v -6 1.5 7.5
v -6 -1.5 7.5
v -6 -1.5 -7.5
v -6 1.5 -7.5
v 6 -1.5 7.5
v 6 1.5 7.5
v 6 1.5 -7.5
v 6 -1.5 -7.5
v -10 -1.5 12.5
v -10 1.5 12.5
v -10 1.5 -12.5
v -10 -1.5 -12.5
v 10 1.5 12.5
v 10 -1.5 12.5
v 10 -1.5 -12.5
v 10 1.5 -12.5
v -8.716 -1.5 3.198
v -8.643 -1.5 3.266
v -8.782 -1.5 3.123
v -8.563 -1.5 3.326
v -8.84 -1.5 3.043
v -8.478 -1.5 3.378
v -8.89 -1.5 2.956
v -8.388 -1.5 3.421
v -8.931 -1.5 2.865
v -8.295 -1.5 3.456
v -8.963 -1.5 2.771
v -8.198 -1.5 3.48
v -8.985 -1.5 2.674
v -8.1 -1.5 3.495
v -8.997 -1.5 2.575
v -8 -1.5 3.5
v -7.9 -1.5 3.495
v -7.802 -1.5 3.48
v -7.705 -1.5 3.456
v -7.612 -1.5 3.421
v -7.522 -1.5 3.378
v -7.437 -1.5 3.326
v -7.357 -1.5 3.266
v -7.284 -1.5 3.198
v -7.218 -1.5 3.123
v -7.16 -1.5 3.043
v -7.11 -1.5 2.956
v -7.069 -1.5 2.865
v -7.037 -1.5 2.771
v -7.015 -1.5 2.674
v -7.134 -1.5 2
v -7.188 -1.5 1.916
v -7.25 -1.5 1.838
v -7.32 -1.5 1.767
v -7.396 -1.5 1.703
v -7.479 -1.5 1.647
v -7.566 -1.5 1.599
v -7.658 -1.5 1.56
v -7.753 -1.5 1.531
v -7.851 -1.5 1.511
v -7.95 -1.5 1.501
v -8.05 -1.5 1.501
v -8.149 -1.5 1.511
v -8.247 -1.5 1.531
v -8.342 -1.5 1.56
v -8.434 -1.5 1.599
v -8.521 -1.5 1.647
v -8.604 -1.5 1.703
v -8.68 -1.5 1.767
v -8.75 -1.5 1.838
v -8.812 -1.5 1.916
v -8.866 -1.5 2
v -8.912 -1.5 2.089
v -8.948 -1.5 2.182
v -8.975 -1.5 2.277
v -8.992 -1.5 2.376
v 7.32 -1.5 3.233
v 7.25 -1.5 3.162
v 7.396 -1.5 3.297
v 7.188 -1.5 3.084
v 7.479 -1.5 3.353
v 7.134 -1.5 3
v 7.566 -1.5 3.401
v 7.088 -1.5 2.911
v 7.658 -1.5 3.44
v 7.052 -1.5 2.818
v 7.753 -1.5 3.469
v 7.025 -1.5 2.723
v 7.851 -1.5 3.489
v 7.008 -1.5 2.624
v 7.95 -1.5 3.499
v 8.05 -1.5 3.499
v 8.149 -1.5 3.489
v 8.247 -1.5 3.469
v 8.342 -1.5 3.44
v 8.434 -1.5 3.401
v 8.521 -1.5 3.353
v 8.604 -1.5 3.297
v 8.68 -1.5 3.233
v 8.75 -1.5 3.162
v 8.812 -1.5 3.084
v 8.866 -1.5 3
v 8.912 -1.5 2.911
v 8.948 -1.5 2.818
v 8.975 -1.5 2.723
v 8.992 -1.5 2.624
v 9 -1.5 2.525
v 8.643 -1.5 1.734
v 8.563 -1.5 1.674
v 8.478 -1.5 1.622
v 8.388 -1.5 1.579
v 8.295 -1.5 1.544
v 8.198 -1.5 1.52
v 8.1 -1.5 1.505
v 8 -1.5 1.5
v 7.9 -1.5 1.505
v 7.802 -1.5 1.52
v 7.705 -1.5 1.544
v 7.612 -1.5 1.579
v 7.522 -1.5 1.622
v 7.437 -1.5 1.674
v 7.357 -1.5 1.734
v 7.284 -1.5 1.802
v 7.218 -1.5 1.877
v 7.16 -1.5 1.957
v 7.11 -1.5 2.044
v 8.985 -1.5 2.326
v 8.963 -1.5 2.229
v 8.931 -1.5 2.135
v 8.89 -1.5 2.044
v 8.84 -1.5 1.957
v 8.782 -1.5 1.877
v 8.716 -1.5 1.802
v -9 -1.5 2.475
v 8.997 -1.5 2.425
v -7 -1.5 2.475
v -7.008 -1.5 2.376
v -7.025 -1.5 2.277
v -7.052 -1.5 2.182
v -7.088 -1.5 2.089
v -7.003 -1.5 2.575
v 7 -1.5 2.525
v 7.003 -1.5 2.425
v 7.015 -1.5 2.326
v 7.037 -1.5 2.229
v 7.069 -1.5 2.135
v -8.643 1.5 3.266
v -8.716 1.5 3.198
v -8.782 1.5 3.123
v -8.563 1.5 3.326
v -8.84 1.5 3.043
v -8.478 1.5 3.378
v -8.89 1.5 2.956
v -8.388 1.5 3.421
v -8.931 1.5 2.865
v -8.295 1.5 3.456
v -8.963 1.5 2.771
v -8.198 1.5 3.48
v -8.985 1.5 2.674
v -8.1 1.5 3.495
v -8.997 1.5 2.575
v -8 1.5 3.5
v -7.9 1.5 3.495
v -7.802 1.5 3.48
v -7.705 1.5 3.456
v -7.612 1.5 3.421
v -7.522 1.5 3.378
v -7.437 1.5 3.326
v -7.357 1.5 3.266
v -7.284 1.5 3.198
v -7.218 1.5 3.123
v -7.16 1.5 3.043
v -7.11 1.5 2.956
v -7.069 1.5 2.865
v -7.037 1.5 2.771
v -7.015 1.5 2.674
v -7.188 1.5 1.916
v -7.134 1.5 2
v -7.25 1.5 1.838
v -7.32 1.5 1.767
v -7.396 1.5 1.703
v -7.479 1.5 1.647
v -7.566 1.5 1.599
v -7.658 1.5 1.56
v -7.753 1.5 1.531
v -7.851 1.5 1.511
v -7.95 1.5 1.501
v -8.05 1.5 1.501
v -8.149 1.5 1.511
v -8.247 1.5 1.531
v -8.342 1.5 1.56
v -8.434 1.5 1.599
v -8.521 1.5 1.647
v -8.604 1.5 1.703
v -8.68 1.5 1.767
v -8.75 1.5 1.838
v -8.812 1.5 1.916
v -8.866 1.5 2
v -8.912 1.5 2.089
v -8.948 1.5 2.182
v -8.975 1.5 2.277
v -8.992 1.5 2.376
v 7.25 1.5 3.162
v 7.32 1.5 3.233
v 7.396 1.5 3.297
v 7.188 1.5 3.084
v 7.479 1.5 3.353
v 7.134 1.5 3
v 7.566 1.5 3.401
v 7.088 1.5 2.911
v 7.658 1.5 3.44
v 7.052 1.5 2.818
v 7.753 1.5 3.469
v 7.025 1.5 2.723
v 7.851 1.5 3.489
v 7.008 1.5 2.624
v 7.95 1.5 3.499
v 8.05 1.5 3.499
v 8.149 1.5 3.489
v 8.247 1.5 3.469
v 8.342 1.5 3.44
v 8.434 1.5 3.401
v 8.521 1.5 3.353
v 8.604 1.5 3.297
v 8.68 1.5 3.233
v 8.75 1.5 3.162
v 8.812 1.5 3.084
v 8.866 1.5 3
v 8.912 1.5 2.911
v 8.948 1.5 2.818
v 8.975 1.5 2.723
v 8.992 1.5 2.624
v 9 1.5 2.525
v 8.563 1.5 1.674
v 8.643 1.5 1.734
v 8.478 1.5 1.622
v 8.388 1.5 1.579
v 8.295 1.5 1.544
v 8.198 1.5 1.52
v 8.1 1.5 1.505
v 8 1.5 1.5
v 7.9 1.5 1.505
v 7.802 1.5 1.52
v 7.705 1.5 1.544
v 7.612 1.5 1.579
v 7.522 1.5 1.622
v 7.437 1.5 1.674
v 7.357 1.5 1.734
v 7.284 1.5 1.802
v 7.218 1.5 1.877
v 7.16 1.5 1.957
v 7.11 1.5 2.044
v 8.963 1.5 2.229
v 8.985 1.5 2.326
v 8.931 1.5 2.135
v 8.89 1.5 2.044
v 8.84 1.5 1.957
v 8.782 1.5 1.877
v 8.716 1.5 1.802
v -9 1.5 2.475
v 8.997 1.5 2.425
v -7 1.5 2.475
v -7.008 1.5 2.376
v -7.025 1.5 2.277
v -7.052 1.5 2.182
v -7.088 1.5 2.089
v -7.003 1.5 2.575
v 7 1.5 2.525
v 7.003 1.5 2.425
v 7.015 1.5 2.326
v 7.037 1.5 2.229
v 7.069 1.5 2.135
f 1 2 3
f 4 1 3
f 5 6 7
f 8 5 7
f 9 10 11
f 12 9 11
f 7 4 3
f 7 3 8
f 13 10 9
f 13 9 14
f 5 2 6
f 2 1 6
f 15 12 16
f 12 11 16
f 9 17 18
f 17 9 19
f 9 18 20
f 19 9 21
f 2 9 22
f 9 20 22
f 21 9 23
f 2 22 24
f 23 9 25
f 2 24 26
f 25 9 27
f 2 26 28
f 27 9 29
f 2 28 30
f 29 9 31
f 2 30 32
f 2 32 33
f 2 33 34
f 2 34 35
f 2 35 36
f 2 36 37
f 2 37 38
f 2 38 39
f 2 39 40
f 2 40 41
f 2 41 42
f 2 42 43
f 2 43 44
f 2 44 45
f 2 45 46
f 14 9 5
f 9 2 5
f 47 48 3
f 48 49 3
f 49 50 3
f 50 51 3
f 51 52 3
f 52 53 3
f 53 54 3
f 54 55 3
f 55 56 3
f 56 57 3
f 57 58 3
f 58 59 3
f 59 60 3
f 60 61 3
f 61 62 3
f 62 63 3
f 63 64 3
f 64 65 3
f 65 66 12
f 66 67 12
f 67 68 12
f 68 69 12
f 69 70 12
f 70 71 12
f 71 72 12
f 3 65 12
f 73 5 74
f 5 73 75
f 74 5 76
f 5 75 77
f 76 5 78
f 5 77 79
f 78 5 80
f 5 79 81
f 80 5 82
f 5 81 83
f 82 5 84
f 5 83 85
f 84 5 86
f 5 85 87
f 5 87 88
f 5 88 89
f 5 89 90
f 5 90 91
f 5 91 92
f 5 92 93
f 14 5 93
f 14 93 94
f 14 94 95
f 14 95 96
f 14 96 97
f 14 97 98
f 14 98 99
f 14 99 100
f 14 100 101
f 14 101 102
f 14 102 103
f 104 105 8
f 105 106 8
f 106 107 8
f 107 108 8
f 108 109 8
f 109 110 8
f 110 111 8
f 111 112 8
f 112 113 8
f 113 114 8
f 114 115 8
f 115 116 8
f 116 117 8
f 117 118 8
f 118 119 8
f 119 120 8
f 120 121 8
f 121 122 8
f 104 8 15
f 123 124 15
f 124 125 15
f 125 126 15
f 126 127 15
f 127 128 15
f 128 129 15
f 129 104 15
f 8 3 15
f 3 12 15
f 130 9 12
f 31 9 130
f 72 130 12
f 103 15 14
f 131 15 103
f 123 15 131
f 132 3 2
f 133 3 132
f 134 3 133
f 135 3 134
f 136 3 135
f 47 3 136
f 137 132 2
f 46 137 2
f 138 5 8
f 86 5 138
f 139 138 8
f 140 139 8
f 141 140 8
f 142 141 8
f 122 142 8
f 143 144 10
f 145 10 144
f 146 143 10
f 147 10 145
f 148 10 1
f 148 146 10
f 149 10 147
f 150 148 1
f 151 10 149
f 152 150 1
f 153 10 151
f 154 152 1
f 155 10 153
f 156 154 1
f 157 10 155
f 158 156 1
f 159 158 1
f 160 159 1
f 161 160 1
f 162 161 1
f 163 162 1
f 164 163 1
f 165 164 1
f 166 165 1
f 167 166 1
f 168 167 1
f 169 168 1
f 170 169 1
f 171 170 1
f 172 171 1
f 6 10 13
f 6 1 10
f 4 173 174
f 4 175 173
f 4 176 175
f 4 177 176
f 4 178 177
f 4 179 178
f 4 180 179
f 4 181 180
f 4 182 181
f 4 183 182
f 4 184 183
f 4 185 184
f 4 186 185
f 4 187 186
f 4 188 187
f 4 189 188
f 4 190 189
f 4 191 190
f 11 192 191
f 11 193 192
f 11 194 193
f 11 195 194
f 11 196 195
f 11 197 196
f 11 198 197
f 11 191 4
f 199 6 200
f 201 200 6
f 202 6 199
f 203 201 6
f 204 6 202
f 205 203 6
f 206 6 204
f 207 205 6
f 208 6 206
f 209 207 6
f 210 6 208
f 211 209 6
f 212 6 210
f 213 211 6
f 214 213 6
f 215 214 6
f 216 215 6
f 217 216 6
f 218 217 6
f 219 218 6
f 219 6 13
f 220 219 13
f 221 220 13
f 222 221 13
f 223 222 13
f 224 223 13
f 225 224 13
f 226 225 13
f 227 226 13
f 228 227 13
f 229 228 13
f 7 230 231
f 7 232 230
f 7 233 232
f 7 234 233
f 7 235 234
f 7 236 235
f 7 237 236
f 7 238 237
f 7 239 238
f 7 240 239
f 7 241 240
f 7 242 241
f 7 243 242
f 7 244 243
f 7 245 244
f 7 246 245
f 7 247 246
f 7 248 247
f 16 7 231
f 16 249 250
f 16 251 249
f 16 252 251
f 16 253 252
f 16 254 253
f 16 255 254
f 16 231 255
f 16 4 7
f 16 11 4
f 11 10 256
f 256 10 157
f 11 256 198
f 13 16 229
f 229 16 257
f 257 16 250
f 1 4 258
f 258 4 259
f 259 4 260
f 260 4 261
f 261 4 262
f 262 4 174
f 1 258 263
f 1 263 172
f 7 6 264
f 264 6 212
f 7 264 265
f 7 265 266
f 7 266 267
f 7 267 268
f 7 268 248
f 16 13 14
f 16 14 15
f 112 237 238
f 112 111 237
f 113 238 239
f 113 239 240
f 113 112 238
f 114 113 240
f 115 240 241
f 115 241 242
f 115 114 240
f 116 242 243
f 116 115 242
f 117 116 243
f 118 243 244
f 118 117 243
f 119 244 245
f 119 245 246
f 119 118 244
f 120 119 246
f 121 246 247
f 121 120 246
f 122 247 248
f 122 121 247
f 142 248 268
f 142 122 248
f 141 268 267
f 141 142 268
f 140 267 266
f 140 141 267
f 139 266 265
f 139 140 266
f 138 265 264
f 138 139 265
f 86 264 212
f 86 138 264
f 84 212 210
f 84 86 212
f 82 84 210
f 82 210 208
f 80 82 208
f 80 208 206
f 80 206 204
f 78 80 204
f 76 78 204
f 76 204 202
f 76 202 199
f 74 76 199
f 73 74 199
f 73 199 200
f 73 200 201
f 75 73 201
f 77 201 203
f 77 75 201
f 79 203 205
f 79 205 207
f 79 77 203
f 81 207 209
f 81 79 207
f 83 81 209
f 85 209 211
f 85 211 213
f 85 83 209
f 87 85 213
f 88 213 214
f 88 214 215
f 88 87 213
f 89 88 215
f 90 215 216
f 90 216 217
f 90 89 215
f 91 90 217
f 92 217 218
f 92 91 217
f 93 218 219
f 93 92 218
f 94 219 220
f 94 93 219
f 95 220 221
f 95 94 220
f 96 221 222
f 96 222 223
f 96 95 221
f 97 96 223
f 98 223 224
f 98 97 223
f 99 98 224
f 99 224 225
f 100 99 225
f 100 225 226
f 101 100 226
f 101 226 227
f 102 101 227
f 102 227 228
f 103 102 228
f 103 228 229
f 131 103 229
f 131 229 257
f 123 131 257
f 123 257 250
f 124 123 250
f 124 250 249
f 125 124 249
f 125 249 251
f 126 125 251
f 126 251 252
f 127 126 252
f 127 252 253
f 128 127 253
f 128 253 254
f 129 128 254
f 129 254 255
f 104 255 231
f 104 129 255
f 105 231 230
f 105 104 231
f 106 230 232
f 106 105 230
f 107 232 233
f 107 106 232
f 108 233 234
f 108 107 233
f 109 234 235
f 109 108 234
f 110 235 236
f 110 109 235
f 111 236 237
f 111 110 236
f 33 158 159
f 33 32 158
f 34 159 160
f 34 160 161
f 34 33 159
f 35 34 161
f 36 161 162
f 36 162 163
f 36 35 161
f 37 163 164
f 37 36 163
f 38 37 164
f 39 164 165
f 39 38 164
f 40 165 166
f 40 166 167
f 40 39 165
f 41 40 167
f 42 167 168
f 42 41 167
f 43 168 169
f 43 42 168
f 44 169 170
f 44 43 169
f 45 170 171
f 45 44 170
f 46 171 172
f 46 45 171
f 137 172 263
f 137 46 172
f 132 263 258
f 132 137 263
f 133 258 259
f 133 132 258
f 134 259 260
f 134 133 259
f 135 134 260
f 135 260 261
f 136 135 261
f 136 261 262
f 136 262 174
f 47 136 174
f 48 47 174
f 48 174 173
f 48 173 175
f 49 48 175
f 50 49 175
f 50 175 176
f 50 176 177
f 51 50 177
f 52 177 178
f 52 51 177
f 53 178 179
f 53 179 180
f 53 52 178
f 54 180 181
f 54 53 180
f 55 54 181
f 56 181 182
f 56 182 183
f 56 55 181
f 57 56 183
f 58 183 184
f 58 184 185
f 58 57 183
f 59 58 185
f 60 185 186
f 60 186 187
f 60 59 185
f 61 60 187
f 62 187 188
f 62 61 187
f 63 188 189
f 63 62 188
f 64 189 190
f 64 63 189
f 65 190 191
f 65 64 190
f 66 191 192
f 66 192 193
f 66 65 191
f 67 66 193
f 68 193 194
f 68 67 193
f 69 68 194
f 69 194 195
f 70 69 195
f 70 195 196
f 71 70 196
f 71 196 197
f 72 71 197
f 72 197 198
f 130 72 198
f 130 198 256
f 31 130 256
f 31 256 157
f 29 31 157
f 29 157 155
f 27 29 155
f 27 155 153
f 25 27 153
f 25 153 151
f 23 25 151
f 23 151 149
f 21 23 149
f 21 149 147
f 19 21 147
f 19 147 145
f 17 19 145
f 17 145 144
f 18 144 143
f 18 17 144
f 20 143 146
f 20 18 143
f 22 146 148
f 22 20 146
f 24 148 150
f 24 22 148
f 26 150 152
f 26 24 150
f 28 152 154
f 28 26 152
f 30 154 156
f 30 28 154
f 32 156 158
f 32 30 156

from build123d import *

# Parameters (mm, degrees)
SKETCH1_W           = 20
SKETCH1_H           = 25
SKETCH1_R           = 1
SKETCH1_W_2         = 12
SKETCH1_H_2         = 15
BOSS_EXTRUDE1_DEPTH = 1.5


with BuildPart() as part:
    # Sketch1 → Boss-Extrude1 (new, symmetric)
    with BuildSketch(Plane(origin=(0, 0, 0), x_dir=(1, 0, 0), z_dir=(0, 1, 0))):
        Rectangle(SKETCH1_W, SKETCH1_H)
        with Locations(Location((-8, -2.5, 0), (0, 0, 270))):
            Circle(SKETCH1_R, mode=Mode.SUBTRACT)
        with Locations(Location((8, -2.5, 0), (0, 0, 90))):
            Circle(SKETCH1_R, mode=Mode.SUBTRACT)
        Rectangle(SKETCH1_W_2, SKETCH1_H_2, mode=Mode.SUBTRACT)
    extrude(amount=BOSS_EXTRUDE1_DEPTH, both=True)


solid = part.part
